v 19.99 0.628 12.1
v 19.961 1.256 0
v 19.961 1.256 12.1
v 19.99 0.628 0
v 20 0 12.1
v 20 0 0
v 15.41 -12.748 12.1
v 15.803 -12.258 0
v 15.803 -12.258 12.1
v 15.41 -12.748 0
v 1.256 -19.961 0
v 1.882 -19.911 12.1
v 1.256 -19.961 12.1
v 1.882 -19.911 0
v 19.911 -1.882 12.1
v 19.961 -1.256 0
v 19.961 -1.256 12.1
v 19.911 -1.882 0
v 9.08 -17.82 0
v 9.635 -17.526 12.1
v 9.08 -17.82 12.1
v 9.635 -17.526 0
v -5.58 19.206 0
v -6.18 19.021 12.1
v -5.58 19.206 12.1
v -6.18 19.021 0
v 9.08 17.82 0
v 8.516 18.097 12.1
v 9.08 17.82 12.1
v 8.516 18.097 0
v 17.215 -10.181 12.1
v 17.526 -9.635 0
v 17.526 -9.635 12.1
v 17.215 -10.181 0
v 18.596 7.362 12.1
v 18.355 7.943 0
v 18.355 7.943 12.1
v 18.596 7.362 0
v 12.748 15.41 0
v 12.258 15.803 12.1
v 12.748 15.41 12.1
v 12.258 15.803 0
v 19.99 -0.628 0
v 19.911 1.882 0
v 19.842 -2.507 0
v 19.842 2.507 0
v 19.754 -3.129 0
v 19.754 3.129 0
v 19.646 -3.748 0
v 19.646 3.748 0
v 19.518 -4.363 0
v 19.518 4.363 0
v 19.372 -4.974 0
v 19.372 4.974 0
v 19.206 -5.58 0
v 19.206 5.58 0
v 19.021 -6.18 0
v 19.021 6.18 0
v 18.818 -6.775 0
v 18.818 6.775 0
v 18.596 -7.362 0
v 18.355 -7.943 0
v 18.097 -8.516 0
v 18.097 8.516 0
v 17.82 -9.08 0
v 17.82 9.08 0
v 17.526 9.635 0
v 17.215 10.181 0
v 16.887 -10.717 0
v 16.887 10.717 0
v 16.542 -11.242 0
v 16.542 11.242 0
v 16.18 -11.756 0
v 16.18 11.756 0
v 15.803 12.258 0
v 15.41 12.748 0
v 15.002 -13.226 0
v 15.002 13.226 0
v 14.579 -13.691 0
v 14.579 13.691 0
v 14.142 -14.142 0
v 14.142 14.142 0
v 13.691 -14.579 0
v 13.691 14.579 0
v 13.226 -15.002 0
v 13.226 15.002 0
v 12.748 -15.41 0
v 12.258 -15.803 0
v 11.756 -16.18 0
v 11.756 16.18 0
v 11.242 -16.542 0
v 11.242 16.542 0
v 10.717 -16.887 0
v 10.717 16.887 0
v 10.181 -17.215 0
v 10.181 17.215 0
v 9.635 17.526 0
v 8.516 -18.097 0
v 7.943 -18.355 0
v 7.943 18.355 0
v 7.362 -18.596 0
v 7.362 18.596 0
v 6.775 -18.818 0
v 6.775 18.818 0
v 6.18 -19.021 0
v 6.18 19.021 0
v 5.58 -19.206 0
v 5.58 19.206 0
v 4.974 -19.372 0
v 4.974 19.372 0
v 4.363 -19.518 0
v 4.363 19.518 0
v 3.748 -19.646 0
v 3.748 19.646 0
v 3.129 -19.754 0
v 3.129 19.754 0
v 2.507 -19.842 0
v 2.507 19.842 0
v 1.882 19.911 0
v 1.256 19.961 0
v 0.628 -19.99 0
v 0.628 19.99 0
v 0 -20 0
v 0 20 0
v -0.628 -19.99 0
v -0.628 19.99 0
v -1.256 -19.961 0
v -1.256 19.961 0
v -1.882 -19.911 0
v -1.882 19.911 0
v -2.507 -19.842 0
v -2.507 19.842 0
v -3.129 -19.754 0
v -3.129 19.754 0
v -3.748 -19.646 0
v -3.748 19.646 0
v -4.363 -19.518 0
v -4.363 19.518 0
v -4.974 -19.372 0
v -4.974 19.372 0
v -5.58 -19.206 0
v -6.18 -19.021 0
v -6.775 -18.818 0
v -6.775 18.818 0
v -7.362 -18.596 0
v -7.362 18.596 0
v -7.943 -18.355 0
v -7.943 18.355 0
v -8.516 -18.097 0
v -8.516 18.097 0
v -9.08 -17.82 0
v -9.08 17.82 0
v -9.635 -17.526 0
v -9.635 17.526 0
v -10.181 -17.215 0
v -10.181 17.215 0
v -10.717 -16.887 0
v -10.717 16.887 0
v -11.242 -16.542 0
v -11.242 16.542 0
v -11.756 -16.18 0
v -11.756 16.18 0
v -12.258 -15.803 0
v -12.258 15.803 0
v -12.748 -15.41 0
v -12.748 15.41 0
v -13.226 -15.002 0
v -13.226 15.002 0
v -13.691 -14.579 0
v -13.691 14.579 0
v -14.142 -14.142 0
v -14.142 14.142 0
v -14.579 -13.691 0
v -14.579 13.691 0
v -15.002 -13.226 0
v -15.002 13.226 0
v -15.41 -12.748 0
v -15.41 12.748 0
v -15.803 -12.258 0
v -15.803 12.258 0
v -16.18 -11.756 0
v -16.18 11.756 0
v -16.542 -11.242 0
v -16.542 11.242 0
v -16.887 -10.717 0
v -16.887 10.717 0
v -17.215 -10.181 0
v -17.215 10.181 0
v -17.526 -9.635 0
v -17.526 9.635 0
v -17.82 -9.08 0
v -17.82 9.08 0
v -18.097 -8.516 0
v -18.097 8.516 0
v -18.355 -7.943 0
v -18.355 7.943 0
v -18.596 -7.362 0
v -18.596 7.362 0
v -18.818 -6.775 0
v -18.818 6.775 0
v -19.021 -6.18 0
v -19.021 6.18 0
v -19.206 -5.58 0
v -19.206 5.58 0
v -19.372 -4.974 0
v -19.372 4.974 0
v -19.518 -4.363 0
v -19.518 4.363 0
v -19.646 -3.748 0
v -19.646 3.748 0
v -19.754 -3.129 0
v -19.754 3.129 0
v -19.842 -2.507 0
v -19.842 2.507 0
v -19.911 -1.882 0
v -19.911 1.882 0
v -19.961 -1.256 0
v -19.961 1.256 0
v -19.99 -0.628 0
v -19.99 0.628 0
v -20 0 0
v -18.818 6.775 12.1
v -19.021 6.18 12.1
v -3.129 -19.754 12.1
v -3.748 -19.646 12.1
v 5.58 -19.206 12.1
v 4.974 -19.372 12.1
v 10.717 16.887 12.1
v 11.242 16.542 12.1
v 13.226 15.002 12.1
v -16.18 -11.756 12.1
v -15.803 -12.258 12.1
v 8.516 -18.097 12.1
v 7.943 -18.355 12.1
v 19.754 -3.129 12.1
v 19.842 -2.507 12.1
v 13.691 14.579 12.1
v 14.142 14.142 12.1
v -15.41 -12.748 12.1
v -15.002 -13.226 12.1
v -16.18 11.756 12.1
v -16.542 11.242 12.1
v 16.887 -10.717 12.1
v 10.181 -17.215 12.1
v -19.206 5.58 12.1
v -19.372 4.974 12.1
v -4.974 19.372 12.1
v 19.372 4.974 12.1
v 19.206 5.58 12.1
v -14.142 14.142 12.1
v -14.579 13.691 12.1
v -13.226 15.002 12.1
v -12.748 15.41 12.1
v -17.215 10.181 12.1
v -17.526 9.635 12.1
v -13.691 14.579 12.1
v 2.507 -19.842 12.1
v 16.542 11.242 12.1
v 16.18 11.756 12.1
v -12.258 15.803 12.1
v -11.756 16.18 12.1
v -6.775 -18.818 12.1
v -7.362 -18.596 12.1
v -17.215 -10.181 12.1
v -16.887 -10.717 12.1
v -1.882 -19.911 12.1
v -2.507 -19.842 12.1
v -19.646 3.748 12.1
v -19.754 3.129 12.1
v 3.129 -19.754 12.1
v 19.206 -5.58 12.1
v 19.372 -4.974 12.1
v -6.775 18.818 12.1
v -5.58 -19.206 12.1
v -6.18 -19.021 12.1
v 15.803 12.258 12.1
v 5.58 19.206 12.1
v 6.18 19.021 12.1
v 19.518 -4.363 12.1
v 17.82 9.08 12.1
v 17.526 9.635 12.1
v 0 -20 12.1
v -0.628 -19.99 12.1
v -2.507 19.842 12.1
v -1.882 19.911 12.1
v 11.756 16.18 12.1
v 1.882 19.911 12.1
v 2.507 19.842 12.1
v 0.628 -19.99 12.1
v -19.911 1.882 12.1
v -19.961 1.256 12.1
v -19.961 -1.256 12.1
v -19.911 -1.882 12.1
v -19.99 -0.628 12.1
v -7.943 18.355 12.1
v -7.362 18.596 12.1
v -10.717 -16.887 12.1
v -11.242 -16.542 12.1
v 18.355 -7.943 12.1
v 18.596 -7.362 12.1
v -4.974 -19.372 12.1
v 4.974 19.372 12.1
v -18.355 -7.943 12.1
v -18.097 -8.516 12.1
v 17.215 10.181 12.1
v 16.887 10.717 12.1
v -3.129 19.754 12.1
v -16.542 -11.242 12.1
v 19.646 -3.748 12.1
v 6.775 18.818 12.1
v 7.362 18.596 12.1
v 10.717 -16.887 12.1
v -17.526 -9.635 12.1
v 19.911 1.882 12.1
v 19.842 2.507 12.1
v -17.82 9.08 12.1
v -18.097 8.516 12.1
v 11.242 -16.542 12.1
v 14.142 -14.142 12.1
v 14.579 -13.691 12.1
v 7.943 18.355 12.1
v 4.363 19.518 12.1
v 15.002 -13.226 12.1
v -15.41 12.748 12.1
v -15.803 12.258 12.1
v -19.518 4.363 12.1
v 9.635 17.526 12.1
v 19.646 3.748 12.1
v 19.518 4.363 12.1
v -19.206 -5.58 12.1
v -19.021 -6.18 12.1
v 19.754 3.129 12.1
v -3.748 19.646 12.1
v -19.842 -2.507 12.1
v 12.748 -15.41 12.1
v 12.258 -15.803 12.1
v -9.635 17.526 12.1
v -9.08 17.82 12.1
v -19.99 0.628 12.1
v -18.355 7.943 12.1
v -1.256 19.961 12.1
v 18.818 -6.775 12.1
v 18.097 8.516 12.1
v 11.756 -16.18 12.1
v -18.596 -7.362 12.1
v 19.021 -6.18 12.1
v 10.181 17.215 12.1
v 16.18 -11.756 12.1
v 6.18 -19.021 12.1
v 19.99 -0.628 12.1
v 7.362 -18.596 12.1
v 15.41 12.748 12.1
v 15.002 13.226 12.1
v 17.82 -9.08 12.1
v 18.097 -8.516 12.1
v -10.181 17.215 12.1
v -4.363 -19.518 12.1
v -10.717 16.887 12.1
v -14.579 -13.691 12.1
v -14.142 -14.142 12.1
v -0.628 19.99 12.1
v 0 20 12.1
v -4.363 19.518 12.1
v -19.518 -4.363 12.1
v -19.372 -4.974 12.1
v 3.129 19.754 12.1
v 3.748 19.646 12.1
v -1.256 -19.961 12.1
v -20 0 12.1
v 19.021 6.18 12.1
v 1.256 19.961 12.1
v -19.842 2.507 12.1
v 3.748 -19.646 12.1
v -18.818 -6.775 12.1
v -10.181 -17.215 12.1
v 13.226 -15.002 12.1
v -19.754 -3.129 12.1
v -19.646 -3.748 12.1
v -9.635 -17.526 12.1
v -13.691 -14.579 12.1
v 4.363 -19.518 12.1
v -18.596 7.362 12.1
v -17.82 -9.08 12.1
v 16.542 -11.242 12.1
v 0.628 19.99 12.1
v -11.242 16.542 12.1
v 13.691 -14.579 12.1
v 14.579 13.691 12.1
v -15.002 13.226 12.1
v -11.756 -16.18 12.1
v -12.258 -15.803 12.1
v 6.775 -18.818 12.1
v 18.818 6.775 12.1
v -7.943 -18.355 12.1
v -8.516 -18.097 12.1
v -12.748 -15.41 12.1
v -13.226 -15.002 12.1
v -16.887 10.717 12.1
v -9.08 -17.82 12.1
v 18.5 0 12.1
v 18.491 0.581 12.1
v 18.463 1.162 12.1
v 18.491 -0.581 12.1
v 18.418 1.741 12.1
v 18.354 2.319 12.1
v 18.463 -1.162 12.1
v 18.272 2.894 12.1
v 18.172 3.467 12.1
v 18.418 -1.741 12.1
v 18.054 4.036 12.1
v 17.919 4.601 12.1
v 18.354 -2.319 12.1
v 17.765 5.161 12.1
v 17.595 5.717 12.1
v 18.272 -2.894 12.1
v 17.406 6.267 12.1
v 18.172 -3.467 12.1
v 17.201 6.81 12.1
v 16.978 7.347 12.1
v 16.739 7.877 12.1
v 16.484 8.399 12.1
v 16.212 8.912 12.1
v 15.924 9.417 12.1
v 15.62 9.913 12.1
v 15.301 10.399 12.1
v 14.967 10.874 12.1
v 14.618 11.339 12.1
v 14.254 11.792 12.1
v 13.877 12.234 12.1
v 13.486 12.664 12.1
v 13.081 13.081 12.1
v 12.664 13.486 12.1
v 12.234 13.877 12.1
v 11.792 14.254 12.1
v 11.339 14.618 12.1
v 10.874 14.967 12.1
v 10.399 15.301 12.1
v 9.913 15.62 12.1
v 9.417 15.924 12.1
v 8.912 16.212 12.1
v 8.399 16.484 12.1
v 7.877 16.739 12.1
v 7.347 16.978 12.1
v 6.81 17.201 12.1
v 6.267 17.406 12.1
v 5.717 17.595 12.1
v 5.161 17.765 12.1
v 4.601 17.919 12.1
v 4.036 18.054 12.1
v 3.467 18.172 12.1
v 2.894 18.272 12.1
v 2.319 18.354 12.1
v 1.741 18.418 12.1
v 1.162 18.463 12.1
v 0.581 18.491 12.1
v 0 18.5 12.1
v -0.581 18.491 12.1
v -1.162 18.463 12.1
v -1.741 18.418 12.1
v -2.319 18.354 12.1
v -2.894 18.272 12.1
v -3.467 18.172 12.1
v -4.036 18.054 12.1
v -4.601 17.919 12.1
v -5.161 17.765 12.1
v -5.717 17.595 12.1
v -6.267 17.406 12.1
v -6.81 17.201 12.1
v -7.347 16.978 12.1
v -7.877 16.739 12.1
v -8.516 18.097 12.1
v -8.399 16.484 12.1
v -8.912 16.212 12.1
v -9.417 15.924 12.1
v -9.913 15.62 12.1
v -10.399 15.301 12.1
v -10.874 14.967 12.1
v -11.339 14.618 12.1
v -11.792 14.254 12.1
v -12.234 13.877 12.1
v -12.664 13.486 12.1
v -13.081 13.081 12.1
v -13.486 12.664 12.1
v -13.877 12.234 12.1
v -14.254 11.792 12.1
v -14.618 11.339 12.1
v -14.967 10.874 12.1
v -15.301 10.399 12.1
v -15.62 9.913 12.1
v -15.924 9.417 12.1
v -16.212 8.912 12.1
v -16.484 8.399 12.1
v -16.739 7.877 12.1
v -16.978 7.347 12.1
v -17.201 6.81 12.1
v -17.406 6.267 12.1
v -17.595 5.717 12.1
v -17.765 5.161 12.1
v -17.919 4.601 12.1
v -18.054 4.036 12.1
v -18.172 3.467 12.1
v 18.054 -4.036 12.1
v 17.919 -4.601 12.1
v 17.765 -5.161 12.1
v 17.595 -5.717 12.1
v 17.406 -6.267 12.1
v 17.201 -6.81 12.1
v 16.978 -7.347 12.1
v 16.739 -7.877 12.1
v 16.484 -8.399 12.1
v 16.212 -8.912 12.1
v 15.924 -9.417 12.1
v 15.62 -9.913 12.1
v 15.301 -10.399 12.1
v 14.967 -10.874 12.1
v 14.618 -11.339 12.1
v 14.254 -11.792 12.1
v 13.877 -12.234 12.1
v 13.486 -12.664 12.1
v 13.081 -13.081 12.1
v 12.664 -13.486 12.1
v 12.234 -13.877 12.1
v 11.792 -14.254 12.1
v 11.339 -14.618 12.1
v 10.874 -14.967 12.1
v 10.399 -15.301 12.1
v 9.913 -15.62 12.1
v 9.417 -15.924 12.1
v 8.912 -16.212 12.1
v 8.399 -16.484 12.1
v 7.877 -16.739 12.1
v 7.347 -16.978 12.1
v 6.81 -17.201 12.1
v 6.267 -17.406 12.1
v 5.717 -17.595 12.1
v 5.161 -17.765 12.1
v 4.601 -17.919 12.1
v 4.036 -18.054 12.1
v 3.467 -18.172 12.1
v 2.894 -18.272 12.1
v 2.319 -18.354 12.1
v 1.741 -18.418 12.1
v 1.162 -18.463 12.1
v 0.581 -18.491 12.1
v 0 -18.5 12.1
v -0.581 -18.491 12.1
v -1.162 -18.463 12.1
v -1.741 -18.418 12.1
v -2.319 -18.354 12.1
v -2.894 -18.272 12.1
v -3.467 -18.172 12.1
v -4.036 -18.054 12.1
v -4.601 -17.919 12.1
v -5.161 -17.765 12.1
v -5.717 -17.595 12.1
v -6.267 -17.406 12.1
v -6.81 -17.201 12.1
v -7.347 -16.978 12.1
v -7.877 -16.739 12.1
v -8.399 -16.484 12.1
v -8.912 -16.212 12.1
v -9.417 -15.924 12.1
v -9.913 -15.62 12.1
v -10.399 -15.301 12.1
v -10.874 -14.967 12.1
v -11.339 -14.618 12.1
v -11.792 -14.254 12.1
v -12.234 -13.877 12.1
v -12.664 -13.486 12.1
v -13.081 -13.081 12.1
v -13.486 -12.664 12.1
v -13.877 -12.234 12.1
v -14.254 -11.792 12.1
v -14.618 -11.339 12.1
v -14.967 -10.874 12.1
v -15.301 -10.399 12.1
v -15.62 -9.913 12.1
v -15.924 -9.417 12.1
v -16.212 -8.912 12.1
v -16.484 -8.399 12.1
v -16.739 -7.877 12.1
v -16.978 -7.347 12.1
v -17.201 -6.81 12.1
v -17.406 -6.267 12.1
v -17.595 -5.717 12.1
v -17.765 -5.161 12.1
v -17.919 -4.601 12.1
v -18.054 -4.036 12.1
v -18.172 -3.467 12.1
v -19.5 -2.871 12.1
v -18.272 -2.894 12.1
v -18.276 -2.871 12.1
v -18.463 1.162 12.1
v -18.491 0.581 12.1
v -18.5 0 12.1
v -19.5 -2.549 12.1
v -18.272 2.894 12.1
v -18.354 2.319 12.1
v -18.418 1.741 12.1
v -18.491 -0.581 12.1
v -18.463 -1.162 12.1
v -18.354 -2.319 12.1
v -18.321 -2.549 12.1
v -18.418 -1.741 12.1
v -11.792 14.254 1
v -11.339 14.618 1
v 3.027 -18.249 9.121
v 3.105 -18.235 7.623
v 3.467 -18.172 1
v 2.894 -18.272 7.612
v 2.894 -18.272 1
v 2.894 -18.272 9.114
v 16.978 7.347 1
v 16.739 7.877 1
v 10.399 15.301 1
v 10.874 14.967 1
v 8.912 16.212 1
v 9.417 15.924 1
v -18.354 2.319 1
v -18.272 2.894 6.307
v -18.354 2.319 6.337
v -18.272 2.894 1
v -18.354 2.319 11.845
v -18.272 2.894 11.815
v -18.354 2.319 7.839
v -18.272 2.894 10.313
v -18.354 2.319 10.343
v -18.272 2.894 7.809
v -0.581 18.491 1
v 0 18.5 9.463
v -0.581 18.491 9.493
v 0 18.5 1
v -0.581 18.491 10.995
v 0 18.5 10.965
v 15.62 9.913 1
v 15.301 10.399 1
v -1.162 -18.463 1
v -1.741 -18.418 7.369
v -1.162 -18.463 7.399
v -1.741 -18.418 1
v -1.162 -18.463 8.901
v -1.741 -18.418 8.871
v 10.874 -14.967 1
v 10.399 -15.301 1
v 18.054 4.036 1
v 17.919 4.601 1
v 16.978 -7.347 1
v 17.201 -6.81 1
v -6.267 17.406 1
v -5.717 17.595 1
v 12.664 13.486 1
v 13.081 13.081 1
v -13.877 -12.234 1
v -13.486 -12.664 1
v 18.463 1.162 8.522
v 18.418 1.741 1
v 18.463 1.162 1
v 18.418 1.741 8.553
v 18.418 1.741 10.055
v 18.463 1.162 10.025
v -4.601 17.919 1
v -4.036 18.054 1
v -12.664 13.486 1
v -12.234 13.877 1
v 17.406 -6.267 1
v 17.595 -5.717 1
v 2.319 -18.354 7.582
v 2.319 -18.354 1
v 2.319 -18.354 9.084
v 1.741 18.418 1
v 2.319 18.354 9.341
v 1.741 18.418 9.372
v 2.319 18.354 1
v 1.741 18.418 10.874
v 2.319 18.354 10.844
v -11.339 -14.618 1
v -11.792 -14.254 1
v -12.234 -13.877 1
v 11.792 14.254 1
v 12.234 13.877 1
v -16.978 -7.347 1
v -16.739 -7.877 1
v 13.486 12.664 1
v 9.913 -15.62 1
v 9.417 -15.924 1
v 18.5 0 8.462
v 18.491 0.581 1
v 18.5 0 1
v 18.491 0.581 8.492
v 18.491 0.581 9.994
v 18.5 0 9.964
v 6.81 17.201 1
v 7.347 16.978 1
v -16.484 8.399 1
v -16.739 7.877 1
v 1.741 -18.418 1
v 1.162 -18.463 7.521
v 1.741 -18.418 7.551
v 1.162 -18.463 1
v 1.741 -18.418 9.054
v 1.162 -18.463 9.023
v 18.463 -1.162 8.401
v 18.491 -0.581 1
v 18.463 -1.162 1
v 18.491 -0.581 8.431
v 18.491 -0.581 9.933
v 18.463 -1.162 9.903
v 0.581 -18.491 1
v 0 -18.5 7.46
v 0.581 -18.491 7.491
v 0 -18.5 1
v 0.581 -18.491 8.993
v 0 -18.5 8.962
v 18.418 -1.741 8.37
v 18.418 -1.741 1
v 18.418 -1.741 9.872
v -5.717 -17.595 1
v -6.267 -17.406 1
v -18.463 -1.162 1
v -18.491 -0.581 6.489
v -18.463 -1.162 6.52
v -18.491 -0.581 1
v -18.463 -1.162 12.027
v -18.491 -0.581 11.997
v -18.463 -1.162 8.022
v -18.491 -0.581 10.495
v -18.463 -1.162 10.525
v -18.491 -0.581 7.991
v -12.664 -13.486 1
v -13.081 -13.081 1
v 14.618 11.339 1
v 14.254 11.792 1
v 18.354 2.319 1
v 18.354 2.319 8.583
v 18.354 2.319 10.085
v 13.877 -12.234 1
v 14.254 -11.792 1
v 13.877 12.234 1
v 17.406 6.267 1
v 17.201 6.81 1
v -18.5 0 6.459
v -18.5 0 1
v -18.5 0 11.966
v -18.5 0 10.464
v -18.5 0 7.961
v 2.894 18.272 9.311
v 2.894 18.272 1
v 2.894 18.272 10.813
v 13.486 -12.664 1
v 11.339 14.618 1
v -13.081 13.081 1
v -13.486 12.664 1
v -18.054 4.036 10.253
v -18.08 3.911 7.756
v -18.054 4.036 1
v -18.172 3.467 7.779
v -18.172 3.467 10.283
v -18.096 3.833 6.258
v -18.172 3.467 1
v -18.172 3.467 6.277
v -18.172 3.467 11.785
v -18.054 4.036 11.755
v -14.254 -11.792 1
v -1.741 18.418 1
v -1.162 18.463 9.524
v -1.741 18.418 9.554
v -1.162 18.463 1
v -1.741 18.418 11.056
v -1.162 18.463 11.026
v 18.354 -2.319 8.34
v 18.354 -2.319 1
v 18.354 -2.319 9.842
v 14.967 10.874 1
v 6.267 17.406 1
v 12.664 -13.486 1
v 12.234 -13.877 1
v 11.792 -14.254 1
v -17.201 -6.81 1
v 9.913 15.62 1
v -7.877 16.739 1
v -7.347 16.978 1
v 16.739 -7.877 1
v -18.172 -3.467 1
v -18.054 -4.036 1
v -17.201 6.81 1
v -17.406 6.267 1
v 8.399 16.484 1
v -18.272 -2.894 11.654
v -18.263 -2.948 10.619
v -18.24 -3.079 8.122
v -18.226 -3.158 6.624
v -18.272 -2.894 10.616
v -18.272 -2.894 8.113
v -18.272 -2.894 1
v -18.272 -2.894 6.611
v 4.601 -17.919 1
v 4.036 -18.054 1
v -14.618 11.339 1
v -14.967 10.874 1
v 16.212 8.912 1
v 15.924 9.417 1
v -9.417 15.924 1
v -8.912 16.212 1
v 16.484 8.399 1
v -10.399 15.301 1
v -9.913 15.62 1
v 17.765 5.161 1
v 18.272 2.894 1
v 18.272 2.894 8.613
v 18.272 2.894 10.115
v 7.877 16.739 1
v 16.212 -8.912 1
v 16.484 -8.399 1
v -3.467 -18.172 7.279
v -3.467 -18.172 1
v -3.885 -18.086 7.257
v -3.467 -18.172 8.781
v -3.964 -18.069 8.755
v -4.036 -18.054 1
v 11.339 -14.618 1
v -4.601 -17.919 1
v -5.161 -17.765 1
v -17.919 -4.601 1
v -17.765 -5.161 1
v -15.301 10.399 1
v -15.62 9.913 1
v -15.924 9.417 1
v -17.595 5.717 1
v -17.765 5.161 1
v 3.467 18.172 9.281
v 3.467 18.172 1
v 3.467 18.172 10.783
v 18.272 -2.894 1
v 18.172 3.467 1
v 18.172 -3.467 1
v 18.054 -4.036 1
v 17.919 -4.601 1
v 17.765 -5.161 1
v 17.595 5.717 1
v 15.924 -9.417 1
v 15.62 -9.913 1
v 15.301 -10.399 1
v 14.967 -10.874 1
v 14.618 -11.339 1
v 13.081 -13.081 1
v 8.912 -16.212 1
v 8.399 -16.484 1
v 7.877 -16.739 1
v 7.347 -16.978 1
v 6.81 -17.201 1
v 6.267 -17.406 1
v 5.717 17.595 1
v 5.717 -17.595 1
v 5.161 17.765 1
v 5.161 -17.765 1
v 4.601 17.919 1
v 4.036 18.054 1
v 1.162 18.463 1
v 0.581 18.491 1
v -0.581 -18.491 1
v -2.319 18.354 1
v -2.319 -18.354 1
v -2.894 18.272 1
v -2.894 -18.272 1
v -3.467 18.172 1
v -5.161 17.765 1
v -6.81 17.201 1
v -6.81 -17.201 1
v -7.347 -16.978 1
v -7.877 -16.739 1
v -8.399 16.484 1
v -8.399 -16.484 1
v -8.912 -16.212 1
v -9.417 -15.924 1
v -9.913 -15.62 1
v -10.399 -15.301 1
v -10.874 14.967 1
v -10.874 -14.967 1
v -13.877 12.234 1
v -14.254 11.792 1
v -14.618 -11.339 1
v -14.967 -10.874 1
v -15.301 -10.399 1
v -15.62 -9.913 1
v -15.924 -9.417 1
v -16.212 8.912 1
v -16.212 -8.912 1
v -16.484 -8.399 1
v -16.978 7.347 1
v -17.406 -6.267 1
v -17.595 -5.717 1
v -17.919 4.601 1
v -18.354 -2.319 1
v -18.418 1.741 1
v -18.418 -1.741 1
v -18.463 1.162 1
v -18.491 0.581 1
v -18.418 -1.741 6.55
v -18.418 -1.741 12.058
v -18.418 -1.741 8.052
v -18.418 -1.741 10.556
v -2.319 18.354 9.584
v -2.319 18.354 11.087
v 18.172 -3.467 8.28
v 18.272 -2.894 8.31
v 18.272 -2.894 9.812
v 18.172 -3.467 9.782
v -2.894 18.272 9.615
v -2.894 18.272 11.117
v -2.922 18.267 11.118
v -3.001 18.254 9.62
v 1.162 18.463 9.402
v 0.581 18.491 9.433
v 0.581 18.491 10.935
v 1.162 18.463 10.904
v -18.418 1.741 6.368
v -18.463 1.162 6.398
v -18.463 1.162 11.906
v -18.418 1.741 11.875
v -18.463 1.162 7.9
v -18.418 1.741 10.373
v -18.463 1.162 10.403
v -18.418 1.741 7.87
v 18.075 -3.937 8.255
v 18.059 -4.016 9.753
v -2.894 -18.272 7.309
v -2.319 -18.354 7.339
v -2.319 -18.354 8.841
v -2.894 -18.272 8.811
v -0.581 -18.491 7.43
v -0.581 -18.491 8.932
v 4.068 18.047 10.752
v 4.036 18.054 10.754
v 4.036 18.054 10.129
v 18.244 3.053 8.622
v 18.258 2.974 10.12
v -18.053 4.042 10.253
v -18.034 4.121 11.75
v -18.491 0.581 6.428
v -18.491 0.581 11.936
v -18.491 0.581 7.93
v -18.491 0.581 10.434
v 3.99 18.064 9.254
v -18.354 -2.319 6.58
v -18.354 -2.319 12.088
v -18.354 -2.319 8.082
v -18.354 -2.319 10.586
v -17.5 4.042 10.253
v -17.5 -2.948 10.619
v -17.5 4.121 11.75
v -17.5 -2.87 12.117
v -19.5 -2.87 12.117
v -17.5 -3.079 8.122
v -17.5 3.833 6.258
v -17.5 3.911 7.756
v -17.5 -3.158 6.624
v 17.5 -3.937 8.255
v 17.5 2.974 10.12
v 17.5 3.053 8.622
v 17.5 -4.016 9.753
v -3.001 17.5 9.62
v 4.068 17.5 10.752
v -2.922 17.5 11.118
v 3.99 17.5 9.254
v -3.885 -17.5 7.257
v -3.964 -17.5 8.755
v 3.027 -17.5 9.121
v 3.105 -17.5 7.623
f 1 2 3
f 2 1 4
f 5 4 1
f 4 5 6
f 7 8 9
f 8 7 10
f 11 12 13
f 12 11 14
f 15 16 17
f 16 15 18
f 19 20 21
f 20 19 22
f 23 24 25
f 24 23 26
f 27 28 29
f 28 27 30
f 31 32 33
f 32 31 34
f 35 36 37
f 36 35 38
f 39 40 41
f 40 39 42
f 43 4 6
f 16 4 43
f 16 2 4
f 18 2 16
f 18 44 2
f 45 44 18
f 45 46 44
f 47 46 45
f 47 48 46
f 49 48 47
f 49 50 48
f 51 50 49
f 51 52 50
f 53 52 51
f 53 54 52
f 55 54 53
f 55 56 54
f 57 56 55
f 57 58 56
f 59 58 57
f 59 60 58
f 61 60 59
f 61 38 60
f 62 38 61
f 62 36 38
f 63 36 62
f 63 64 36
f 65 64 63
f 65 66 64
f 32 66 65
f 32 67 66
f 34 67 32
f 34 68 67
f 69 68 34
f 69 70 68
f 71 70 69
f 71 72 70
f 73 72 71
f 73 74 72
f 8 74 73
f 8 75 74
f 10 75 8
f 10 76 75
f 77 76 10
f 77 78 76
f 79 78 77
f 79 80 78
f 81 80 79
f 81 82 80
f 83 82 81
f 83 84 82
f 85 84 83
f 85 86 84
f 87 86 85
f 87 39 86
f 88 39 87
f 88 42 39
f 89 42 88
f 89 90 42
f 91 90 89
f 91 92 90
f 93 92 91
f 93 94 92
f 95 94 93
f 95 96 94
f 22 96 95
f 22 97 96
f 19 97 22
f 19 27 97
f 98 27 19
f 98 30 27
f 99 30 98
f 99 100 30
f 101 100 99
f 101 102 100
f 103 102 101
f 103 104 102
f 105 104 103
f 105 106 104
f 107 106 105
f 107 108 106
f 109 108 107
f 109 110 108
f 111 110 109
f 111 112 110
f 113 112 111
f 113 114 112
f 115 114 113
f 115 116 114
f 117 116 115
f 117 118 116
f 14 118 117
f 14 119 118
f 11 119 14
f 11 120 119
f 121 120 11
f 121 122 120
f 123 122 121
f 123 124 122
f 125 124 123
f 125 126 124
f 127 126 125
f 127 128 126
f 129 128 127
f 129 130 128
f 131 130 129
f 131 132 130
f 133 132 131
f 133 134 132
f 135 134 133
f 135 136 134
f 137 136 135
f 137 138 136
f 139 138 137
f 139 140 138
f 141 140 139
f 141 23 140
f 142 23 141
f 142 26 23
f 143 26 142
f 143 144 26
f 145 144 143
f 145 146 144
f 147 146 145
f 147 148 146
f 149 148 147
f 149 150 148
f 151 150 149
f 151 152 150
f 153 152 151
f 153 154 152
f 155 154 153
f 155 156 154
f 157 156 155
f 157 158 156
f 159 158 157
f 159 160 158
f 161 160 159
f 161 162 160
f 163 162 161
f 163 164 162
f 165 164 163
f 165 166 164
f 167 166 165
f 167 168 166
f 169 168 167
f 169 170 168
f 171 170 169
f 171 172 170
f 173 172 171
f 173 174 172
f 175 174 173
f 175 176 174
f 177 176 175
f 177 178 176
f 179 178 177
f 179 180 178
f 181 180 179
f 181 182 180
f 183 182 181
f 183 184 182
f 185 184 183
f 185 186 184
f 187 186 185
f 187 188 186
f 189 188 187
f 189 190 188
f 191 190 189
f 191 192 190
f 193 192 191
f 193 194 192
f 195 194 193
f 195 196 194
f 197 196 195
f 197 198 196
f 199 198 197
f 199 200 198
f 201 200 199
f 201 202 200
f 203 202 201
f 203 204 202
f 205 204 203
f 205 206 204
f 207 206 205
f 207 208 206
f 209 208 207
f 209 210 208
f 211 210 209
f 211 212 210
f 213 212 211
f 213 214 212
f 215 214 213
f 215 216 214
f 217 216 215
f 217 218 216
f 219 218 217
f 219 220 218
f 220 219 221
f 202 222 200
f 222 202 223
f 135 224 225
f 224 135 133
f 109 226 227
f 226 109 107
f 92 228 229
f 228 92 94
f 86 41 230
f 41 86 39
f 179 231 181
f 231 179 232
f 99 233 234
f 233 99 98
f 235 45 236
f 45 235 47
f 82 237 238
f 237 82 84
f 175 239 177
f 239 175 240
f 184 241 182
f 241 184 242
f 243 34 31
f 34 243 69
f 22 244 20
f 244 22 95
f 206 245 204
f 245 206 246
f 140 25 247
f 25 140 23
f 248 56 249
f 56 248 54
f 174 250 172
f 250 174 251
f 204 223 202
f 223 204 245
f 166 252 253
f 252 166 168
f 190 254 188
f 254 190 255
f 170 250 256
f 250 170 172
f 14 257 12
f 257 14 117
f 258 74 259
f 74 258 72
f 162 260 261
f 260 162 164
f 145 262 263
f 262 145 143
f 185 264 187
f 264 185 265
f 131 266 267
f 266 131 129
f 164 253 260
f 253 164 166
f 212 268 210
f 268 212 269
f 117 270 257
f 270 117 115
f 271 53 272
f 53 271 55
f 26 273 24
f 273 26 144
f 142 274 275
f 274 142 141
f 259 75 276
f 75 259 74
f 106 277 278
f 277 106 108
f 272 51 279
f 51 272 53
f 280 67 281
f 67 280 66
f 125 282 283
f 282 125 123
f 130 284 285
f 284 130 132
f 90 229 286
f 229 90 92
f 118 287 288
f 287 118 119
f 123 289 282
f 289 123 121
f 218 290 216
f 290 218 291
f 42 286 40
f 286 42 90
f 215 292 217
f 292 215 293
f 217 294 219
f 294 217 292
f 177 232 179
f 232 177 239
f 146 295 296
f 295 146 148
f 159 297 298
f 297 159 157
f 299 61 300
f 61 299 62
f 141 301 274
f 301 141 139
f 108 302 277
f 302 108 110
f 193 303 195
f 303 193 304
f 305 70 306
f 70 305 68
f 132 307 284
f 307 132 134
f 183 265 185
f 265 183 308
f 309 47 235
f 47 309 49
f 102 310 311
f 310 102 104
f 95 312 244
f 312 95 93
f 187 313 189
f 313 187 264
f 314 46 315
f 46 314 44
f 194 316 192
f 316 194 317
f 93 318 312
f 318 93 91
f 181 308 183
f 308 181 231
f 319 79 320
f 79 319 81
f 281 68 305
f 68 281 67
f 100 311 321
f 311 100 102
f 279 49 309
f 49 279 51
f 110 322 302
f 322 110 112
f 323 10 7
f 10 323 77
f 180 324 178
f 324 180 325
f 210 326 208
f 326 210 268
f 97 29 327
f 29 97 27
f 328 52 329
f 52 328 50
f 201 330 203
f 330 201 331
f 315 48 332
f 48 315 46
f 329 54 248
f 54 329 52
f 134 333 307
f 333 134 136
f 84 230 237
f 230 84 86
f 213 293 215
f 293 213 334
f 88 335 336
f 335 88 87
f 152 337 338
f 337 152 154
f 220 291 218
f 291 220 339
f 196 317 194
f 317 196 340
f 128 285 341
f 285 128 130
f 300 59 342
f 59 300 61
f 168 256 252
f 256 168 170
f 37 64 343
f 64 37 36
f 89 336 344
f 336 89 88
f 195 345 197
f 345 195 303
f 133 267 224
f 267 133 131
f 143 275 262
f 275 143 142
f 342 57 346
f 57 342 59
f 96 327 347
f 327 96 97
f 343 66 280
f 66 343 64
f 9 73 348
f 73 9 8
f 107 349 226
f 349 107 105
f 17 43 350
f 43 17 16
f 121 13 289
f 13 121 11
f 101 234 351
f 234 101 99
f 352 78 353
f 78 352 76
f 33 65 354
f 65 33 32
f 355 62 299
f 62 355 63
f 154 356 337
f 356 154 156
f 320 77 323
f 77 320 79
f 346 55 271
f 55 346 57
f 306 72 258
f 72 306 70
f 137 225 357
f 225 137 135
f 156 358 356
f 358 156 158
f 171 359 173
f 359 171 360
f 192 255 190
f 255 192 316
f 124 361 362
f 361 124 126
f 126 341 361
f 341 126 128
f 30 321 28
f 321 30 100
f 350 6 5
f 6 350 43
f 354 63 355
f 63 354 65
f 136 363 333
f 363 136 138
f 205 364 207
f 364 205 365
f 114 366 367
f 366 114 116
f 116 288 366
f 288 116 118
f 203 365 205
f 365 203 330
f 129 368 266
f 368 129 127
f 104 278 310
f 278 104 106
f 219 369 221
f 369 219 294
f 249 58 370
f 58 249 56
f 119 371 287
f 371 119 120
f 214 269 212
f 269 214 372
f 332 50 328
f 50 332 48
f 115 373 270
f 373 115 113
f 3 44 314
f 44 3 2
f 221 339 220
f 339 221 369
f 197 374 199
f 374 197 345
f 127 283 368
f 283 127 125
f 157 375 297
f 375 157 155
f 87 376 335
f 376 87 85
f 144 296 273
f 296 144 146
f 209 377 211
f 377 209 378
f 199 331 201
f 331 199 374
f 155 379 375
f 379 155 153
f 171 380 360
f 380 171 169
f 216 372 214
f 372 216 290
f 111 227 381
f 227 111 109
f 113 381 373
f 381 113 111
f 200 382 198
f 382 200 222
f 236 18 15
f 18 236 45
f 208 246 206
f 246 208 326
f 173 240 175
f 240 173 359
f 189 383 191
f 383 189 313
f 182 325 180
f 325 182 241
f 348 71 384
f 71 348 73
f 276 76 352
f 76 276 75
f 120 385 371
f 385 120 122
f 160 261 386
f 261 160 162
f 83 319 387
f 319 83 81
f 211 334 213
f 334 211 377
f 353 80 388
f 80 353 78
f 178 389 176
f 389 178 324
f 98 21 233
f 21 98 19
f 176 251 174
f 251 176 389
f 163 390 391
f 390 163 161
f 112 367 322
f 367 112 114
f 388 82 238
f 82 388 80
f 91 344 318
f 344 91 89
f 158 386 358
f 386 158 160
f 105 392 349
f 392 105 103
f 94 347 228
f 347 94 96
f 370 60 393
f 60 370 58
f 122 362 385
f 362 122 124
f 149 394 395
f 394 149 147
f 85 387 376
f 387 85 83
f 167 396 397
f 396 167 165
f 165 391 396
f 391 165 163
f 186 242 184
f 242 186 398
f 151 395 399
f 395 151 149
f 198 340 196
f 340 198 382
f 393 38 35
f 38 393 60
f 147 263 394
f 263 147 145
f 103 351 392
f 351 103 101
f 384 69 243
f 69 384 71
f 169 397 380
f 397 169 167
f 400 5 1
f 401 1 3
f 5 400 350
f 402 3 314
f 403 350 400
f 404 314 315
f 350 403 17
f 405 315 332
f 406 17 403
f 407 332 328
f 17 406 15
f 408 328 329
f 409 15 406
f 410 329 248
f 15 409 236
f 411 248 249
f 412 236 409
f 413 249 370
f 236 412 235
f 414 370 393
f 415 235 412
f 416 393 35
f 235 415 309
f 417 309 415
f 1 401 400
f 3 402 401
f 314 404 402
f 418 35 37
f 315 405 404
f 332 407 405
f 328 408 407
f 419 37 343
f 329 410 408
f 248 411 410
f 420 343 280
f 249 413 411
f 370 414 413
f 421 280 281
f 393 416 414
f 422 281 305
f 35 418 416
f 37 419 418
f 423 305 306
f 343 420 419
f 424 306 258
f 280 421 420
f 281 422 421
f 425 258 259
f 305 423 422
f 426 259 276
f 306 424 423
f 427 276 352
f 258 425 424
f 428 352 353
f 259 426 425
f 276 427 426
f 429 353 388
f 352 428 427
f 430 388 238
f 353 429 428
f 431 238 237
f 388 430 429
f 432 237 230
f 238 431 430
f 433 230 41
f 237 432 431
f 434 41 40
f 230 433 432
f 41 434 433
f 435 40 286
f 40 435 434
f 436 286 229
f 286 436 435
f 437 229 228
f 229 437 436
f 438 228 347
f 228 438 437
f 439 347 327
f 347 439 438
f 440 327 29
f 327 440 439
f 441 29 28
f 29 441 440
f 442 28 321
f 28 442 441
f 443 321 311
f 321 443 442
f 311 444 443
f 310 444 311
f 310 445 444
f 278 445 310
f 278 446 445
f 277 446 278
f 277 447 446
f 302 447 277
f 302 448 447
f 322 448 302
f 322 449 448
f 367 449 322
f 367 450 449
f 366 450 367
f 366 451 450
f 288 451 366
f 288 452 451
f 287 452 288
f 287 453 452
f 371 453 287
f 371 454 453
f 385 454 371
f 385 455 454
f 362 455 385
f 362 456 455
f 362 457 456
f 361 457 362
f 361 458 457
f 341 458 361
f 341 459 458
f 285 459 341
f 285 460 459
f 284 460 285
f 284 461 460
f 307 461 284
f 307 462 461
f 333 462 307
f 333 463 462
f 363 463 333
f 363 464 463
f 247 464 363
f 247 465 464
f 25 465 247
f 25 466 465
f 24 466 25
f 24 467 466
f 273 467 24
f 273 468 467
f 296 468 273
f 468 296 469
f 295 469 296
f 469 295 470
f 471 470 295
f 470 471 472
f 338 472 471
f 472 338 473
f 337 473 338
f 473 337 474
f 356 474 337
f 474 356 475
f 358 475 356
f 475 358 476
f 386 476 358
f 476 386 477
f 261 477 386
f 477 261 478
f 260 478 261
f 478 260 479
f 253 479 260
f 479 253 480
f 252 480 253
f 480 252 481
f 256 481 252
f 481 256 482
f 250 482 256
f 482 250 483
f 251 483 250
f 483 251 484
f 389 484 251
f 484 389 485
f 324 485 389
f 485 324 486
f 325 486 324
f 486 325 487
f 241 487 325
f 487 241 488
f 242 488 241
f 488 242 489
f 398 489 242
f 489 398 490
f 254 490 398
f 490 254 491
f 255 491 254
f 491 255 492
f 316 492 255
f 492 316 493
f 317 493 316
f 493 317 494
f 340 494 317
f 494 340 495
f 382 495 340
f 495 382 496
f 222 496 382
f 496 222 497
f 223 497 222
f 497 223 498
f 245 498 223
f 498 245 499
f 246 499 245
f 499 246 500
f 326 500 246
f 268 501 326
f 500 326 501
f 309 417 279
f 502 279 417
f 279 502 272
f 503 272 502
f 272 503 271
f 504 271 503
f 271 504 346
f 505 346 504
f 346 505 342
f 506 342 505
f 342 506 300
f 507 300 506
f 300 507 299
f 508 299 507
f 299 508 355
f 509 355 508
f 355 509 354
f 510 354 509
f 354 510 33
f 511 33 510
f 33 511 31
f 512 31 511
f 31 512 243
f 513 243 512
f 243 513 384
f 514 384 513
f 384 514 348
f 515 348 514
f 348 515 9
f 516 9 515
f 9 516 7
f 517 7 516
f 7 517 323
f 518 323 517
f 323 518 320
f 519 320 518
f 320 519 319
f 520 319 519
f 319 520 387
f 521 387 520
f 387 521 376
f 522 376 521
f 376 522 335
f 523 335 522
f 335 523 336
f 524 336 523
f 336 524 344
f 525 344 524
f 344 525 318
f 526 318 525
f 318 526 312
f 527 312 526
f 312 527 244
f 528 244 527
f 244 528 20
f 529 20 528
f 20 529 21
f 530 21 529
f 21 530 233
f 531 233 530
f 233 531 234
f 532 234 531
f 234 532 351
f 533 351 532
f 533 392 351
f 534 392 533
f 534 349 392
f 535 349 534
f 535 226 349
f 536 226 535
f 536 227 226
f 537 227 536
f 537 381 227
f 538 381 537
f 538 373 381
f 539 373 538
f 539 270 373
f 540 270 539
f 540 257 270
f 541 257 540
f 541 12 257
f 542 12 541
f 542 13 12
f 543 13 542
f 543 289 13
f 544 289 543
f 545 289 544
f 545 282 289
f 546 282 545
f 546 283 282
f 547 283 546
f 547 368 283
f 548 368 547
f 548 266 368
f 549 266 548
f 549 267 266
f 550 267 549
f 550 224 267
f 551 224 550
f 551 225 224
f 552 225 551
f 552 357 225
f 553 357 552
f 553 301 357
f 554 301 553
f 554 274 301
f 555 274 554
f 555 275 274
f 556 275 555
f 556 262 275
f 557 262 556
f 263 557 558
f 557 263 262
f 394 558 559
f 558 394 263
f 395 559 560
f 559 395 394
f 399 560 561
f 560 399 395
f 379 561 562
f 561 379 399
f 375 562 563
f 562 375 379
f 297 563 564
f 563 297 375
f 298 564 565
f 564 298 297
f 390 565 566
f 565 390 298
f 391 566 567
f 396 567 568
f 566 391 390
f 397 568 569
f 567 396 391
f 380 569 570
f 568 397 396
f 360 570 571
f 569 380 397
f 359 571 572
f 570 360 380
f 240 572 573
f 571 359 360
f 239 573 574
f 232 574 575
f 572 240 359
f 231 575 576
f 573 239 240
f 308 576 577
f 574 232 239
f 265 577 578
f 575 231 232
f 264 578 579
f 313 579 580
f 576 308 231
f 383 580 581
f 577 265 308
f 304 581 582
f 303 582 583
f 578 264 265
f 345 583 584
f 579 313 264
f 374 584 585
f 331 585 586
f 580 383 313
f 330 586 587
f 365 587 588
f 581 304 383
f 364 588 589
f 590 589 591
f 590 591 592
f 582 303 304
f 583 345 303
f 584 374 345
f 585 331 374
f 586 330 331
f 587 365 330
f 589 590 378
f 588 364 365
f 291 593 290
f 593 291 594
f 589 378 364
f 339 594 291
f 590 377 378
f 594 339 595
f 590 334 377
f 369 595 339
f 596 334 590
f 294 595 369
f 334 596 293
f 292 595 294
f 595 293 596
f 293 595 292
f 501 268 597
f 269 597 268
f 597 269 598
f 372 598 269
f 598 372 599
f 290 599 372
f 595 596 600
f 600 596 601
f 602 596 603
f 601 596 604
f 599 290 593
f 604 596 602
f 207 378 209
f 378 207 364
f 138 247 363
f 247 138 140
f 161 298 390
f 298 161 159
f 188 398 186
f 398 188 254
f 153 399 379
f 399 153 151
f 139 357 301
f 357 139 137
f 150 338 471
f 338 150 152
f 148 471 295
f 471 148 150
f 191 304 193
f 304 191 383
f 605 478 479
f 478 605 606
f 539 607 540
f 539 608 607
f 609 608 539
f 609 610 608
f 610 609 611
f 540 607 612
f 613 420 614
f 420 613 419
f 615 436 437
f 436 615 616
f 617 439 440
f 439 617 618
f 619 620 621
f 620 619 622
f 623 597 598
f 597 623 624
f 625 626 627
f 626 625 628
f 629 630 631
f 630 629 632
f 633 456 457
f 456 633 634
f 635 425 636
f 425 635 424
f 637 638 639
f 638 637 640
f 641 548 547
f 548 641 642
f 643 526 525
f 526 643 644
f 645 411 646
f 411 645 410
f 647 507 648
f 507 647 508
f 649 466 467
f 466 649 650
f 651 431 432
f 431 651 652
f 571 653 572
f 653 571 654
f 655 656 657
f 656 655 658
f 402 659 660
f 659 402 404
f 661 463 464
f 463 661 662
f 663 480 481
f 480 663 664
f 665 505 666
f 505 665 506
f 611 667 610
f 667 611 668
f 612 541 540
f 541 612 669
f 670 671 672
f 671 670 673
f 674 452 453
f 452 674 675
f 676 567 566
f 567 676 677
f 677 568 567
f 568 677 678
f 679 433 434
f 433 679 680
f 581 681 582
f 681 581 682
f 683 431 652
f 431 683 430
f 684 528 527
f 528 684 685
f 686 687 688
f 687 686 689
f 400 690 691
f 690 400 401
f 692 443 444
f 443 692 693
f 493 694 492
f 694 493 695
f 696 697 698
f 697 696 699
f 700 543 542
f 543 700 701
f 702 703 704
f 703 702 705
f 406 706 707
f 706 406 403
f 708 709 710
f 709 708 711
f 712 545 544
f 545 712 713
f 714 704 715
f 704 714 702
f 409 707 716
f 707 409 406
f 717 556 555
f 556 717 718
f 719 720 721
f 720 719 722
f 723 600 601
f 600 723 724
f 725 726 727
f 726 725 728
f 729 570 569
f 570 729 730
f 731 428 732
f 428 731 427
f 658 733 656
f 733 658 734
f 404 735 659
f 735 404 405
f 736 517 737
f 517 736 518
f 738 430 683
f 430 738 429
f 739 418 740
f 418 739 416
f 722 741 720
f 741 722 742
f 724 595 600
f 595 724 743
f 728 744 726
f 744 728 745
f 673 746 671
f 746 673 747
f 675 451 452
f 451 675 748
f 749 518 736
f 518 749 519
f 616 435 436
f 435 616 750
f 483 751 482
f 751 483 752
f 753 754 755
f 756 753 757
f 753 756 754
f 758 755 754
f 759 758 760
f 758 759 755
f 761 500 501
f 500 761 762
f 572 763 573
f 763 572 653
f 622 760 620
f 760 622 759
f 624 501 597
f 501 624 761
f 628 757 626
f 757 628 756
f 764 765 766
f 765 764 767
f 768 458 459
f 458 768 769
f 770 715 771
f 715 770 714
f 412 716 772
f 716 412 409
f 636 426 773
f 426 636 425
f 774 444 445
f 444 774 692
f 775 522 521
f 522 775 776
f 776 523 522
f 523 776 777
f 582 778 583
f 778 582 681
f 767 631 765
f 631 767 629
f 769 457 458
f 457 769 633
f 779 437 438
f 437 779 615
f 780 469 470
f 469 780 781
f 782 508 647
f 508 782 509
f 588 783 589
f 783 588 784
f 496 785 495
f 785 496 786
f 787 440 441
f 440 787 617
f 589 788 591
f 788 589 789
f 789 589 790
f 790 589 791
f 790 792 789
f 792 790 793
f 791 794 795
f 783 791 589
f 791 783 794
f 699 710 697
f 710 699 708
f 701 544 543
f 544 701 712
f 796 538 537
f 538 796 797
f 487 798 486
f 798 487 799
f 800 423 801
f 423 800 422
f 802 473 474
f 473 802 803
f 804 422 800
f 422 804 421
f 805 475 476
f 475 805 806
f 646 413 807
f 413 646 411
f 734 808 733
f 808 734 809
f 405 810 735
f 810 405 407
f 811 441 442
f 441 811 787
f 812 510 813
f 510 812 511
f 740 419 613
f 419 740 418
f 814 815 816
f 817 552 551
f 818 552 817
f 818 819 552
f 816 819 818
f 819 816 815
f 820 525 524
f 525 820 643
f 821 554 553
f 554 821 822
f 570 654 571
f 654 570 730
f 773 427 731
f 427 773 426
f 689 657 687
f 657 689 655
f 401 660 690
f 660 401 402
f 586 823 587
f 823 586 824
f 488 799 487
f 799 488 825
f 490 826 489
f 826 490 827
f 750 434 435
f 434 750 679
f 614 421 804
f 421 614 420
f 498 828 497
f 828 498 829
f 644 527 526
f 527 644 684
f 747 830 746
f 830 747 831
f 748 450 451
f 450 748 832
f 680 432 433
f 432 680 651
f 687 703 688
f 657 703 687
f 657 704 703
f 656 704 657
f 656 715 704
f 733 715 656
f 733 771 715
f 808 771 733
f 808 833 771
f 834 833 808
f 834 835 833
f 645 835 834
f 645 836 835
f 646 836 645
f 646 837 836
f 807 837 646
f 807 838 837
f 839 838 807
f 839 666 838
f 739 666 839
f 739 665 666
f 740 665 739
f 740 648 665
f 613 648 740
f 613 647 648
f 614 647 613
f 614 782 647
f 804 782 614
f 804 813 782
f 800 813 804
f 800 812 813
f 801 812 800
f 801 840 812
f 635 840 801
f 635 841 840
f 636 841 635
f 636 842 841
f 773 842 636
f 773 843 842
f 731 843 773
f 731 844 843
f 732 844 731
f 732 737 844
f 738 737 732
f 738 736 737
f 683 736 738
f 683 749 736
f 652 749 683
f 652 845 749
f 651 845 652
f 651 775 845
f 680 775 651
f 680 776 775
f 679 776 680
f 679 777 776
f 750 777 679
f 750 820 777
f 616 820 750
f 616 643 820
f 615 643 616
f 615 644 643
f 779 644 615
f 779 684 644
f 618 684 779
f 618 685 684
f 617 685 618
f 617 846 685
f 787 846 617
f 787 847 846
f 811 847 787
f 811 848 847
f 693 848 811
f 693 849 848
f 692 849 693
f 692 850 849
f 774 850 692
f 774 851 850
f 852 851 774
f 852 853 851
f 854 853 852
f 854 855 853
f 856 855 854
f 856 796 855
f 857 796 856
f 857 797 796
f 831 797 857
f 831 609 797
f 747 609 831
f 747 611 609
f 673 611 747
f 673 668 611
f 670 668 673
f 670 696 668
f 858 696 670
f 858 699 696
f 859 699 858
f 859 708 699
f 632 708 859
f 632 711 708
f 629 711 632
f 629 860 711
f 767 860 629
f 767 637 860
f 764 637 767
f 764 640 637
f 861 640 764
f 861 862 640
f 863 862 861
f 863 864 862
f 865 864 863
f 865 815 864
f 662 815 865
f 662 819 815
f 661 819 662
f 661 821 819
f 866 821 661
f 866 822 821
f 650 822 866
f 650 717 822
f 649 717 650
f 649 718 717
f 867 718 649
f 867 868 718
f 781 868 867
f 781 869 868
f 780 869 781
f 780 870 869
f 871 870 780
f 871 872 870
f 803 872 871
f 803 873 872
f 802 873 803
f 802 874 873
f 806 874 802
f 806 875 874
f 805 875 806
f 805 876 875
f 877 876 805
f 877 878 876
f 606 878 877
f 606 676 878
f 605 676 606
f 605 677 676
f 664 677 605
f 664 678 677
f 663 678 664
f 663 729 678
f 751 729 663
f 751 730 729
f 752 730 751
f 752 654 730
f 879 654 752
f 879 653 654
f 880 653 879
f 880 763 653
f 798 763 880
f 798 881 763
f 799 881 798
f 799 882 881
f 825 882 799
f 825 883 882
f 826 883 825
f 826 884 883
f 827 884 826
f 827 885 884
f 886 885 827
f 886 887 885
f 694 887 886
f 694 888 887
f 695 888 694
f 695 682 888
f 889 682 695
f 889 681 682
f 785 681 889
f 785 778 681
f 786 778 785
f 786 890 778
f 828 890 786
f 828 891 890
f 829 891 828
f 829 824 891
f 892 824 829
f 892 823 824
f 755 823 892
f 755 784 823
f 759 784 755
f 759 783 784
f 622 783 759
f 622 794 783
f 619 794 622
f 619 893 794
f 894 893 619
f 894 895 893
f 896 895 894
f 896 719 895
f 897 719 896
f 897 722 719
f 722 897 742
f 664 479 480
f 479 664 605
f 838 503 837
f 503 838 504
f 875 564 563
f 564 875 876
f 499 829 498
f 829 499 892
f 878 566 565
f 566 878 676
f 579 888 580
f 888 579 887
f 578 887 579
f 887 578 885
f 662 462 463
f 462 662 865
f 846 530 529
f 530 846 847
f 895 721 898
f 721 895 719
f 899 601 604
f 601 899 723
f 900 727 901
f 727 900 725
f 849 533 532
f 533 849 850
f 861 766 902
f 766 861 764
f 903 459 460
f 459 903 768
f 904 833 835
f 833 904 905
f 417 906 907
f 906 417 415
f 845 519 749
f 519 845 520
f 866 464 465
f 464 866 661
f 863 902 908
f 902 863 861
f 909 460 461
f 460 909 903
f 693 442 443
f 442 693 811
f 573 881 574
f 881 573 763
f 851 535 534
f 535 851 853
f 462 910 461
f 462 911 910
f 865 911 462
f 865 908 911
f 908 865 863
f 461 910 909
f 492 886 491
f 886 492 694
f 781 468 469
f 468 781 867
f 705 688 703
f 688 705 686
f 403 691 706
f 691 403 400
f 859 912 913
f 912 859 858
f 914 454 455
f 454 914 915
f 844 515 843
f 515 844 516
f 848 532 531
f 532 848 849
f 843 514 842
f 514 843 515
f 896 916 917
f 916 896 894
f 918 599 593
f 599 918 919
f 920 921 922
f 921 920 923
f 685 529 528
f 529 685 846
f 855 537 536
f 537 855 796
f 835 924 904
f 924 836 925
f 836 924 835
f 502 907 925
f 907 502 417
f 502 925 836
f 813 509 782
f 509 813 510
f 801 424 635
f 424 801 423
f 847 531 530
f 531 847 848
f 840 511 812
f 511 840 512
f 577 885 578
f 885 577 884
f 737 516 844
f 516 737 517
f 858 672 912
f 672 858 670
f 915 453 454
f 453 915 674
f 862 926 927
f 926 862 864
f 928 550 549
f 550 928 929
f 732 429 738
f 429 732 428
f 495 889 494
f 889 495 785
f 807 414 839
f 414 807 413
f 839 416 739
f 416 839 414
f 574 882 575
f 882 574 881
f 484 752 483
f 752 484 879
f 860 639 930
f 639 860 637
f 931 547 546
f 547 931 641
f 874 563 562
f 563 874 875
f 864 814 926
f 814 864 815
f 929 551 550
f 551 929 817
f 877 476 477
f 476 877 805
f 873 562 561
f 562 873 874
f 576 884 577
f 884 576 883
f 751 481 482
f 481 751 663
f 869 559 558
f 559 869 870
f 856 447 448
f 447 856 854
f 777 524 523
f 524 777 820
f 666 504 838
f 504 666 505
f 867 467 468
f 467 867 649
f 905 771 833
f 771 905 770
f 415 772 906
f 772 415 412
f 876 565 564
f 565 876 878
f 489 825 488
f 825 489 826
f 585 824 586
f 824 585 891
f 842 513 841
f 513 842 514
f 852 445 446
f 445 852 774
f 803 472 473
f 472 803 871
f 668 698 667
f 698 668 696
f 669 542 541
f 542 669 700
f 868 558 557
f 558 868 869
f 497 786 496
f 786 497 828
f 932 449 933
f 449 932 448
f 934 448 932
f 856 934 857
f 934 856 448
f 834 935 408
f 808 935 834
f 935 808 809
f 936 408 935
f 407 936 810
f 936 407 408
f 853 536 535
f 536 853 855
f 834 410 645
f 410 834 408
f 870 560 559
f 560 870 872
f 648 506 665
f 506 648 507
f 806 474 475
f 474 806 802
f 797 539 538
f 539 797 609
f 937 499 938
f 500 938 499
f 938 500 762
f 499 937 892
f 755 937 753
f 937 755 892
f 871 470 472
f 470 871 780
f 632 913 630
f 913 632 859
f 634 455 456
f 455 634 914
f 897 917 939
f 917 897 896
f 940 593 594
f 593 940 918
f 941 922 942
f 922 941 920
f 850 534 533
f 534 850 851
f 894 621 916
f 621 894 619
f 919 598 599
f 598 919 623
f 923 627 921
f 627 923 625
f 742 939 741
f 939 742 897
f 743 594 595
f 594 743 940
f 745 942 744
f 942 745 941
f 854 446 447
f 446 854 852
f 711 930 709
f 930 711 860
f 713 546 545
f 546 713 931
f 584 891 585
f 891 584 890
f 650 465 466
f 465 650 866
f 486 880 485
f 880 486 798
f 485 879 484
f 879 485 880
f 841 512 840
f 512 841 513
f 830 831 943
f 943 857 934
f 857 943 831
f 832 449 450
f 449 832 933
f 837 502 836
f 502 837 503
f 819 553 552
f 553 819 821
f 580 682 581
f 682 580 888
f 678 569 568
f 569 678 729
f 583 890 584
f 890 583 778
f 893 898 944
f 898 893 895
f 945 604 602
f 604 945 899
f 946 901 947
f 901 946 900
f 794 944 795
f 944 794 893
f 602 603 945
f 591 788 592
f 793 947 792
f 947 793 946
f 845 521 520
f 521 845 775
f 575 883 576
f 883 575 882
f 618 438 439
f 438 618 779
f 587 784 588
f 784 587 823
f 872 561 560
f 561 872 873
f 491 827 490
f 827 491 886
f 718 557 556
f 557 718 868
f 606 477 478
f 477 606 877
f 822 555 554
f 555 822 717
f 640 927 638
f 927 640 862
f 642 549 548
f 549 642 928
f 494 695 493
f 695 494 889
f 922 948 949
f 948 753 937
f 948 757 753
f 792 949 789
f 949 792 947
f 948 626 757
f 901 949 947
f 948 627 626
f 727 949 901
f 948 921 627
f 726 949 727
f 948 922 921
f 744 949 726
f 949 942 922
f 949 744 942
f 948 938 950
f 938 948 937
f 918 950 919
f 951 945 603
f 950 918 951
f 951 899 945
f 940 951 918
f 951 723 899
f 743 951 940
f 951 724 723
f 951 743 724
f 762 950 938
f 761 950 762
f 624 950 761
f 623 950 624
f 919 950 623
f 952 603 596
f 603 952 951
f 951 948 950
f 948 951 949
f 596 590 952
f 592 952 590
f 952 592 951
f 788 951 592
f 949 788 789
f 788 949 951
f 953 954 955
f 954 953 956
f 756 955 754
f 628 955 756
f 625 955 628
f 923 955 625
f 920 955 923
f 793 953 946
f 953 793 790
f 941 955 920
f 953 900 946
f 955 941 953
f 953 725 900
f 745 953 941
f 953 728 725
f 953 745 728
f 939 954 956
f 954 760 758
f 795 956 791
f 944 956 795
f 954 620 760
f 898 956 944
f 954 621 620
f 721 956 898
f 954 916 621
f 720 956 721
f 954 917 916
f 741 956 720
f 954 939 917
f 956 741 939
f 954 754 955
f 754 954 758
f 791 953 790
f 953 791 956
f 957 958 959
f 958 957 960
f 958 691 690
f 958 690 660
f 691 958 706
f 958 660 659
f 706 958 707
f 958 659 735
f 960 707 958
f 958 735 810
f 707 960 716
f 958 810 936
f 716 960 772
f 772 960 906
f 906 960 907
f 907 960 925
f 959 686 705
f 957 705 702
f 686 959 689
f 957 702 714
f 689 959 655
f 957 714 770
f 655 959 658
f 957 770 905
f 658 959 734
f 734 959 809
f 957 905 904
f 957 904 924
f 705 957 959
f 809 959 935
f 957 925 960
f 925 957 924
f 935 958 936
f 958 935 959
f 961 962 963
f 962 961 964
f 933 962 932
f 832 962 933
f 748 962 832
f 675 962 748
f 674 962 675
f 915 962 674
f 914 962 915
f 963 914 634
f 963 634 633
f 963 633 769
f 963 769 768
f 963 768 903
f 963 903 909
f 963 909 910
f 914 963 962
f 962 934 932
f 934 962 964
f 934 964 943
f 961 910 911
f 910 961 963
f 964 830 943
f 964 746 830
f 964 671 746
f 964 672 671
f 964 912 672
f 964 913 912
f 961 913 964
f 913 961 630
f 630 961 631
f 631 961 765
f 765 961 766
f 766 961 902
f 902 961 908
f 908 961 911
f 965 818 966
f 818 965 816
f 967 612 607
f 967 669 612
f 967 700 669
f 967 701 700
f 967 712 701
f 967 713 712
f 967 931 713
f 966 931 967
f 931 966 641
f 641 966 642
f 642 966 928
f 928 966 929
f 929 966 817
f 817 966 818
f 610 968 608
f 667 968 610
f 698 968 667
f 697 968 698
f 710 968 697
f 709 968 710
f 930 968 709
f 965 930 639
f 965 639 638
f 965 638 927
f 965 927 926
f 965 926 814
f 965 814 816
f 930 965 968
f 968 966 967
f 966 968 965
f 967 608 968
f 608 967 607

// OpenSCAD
$fn=200+0;
/* [Cap Type] */
type="solid"; // [coin,hole,solid]
/* [Option Dimensions] */
//dimentions of optional coin slot
slotL=25;
slotW=3;
//diameter of optional hole
holeDia=8;
/* [Hidden] */
height=12.1;
innerDia=37;
outerDia=40;

difference(){
translate([0,0,height/2]) cylinder(d=outerDia,h=height,center=true);
translate([0,0,(height/2)+1]) cylinder(d=innerDia,h=height,center=true);

if (type=="coin") cube([slotL,slotW,10],true);
if (type=="hole") cylinder(d=holeDia,h=10,center=true);
};
rotate([-3,0,0]) translate([-(innerDia/2),0,11.2]) cube([2,7,1.5],true);
rotate([-3,0,0]) translate([-(innerDia/2),0,7.2]) cube([2,7,1.5],true);

rotate([3,0,0]) translate([(innerDia/2),0,9.2]) cube([2,7,1.5],true);

rotate([0,3,0]) translate([0,(innerDia/2),10.2]) cube([7,2,1.5],true);
rotate([0,-3,0]) translate([0,-(innerDia/2),8.2]) cube([7,2,1.5],true);
